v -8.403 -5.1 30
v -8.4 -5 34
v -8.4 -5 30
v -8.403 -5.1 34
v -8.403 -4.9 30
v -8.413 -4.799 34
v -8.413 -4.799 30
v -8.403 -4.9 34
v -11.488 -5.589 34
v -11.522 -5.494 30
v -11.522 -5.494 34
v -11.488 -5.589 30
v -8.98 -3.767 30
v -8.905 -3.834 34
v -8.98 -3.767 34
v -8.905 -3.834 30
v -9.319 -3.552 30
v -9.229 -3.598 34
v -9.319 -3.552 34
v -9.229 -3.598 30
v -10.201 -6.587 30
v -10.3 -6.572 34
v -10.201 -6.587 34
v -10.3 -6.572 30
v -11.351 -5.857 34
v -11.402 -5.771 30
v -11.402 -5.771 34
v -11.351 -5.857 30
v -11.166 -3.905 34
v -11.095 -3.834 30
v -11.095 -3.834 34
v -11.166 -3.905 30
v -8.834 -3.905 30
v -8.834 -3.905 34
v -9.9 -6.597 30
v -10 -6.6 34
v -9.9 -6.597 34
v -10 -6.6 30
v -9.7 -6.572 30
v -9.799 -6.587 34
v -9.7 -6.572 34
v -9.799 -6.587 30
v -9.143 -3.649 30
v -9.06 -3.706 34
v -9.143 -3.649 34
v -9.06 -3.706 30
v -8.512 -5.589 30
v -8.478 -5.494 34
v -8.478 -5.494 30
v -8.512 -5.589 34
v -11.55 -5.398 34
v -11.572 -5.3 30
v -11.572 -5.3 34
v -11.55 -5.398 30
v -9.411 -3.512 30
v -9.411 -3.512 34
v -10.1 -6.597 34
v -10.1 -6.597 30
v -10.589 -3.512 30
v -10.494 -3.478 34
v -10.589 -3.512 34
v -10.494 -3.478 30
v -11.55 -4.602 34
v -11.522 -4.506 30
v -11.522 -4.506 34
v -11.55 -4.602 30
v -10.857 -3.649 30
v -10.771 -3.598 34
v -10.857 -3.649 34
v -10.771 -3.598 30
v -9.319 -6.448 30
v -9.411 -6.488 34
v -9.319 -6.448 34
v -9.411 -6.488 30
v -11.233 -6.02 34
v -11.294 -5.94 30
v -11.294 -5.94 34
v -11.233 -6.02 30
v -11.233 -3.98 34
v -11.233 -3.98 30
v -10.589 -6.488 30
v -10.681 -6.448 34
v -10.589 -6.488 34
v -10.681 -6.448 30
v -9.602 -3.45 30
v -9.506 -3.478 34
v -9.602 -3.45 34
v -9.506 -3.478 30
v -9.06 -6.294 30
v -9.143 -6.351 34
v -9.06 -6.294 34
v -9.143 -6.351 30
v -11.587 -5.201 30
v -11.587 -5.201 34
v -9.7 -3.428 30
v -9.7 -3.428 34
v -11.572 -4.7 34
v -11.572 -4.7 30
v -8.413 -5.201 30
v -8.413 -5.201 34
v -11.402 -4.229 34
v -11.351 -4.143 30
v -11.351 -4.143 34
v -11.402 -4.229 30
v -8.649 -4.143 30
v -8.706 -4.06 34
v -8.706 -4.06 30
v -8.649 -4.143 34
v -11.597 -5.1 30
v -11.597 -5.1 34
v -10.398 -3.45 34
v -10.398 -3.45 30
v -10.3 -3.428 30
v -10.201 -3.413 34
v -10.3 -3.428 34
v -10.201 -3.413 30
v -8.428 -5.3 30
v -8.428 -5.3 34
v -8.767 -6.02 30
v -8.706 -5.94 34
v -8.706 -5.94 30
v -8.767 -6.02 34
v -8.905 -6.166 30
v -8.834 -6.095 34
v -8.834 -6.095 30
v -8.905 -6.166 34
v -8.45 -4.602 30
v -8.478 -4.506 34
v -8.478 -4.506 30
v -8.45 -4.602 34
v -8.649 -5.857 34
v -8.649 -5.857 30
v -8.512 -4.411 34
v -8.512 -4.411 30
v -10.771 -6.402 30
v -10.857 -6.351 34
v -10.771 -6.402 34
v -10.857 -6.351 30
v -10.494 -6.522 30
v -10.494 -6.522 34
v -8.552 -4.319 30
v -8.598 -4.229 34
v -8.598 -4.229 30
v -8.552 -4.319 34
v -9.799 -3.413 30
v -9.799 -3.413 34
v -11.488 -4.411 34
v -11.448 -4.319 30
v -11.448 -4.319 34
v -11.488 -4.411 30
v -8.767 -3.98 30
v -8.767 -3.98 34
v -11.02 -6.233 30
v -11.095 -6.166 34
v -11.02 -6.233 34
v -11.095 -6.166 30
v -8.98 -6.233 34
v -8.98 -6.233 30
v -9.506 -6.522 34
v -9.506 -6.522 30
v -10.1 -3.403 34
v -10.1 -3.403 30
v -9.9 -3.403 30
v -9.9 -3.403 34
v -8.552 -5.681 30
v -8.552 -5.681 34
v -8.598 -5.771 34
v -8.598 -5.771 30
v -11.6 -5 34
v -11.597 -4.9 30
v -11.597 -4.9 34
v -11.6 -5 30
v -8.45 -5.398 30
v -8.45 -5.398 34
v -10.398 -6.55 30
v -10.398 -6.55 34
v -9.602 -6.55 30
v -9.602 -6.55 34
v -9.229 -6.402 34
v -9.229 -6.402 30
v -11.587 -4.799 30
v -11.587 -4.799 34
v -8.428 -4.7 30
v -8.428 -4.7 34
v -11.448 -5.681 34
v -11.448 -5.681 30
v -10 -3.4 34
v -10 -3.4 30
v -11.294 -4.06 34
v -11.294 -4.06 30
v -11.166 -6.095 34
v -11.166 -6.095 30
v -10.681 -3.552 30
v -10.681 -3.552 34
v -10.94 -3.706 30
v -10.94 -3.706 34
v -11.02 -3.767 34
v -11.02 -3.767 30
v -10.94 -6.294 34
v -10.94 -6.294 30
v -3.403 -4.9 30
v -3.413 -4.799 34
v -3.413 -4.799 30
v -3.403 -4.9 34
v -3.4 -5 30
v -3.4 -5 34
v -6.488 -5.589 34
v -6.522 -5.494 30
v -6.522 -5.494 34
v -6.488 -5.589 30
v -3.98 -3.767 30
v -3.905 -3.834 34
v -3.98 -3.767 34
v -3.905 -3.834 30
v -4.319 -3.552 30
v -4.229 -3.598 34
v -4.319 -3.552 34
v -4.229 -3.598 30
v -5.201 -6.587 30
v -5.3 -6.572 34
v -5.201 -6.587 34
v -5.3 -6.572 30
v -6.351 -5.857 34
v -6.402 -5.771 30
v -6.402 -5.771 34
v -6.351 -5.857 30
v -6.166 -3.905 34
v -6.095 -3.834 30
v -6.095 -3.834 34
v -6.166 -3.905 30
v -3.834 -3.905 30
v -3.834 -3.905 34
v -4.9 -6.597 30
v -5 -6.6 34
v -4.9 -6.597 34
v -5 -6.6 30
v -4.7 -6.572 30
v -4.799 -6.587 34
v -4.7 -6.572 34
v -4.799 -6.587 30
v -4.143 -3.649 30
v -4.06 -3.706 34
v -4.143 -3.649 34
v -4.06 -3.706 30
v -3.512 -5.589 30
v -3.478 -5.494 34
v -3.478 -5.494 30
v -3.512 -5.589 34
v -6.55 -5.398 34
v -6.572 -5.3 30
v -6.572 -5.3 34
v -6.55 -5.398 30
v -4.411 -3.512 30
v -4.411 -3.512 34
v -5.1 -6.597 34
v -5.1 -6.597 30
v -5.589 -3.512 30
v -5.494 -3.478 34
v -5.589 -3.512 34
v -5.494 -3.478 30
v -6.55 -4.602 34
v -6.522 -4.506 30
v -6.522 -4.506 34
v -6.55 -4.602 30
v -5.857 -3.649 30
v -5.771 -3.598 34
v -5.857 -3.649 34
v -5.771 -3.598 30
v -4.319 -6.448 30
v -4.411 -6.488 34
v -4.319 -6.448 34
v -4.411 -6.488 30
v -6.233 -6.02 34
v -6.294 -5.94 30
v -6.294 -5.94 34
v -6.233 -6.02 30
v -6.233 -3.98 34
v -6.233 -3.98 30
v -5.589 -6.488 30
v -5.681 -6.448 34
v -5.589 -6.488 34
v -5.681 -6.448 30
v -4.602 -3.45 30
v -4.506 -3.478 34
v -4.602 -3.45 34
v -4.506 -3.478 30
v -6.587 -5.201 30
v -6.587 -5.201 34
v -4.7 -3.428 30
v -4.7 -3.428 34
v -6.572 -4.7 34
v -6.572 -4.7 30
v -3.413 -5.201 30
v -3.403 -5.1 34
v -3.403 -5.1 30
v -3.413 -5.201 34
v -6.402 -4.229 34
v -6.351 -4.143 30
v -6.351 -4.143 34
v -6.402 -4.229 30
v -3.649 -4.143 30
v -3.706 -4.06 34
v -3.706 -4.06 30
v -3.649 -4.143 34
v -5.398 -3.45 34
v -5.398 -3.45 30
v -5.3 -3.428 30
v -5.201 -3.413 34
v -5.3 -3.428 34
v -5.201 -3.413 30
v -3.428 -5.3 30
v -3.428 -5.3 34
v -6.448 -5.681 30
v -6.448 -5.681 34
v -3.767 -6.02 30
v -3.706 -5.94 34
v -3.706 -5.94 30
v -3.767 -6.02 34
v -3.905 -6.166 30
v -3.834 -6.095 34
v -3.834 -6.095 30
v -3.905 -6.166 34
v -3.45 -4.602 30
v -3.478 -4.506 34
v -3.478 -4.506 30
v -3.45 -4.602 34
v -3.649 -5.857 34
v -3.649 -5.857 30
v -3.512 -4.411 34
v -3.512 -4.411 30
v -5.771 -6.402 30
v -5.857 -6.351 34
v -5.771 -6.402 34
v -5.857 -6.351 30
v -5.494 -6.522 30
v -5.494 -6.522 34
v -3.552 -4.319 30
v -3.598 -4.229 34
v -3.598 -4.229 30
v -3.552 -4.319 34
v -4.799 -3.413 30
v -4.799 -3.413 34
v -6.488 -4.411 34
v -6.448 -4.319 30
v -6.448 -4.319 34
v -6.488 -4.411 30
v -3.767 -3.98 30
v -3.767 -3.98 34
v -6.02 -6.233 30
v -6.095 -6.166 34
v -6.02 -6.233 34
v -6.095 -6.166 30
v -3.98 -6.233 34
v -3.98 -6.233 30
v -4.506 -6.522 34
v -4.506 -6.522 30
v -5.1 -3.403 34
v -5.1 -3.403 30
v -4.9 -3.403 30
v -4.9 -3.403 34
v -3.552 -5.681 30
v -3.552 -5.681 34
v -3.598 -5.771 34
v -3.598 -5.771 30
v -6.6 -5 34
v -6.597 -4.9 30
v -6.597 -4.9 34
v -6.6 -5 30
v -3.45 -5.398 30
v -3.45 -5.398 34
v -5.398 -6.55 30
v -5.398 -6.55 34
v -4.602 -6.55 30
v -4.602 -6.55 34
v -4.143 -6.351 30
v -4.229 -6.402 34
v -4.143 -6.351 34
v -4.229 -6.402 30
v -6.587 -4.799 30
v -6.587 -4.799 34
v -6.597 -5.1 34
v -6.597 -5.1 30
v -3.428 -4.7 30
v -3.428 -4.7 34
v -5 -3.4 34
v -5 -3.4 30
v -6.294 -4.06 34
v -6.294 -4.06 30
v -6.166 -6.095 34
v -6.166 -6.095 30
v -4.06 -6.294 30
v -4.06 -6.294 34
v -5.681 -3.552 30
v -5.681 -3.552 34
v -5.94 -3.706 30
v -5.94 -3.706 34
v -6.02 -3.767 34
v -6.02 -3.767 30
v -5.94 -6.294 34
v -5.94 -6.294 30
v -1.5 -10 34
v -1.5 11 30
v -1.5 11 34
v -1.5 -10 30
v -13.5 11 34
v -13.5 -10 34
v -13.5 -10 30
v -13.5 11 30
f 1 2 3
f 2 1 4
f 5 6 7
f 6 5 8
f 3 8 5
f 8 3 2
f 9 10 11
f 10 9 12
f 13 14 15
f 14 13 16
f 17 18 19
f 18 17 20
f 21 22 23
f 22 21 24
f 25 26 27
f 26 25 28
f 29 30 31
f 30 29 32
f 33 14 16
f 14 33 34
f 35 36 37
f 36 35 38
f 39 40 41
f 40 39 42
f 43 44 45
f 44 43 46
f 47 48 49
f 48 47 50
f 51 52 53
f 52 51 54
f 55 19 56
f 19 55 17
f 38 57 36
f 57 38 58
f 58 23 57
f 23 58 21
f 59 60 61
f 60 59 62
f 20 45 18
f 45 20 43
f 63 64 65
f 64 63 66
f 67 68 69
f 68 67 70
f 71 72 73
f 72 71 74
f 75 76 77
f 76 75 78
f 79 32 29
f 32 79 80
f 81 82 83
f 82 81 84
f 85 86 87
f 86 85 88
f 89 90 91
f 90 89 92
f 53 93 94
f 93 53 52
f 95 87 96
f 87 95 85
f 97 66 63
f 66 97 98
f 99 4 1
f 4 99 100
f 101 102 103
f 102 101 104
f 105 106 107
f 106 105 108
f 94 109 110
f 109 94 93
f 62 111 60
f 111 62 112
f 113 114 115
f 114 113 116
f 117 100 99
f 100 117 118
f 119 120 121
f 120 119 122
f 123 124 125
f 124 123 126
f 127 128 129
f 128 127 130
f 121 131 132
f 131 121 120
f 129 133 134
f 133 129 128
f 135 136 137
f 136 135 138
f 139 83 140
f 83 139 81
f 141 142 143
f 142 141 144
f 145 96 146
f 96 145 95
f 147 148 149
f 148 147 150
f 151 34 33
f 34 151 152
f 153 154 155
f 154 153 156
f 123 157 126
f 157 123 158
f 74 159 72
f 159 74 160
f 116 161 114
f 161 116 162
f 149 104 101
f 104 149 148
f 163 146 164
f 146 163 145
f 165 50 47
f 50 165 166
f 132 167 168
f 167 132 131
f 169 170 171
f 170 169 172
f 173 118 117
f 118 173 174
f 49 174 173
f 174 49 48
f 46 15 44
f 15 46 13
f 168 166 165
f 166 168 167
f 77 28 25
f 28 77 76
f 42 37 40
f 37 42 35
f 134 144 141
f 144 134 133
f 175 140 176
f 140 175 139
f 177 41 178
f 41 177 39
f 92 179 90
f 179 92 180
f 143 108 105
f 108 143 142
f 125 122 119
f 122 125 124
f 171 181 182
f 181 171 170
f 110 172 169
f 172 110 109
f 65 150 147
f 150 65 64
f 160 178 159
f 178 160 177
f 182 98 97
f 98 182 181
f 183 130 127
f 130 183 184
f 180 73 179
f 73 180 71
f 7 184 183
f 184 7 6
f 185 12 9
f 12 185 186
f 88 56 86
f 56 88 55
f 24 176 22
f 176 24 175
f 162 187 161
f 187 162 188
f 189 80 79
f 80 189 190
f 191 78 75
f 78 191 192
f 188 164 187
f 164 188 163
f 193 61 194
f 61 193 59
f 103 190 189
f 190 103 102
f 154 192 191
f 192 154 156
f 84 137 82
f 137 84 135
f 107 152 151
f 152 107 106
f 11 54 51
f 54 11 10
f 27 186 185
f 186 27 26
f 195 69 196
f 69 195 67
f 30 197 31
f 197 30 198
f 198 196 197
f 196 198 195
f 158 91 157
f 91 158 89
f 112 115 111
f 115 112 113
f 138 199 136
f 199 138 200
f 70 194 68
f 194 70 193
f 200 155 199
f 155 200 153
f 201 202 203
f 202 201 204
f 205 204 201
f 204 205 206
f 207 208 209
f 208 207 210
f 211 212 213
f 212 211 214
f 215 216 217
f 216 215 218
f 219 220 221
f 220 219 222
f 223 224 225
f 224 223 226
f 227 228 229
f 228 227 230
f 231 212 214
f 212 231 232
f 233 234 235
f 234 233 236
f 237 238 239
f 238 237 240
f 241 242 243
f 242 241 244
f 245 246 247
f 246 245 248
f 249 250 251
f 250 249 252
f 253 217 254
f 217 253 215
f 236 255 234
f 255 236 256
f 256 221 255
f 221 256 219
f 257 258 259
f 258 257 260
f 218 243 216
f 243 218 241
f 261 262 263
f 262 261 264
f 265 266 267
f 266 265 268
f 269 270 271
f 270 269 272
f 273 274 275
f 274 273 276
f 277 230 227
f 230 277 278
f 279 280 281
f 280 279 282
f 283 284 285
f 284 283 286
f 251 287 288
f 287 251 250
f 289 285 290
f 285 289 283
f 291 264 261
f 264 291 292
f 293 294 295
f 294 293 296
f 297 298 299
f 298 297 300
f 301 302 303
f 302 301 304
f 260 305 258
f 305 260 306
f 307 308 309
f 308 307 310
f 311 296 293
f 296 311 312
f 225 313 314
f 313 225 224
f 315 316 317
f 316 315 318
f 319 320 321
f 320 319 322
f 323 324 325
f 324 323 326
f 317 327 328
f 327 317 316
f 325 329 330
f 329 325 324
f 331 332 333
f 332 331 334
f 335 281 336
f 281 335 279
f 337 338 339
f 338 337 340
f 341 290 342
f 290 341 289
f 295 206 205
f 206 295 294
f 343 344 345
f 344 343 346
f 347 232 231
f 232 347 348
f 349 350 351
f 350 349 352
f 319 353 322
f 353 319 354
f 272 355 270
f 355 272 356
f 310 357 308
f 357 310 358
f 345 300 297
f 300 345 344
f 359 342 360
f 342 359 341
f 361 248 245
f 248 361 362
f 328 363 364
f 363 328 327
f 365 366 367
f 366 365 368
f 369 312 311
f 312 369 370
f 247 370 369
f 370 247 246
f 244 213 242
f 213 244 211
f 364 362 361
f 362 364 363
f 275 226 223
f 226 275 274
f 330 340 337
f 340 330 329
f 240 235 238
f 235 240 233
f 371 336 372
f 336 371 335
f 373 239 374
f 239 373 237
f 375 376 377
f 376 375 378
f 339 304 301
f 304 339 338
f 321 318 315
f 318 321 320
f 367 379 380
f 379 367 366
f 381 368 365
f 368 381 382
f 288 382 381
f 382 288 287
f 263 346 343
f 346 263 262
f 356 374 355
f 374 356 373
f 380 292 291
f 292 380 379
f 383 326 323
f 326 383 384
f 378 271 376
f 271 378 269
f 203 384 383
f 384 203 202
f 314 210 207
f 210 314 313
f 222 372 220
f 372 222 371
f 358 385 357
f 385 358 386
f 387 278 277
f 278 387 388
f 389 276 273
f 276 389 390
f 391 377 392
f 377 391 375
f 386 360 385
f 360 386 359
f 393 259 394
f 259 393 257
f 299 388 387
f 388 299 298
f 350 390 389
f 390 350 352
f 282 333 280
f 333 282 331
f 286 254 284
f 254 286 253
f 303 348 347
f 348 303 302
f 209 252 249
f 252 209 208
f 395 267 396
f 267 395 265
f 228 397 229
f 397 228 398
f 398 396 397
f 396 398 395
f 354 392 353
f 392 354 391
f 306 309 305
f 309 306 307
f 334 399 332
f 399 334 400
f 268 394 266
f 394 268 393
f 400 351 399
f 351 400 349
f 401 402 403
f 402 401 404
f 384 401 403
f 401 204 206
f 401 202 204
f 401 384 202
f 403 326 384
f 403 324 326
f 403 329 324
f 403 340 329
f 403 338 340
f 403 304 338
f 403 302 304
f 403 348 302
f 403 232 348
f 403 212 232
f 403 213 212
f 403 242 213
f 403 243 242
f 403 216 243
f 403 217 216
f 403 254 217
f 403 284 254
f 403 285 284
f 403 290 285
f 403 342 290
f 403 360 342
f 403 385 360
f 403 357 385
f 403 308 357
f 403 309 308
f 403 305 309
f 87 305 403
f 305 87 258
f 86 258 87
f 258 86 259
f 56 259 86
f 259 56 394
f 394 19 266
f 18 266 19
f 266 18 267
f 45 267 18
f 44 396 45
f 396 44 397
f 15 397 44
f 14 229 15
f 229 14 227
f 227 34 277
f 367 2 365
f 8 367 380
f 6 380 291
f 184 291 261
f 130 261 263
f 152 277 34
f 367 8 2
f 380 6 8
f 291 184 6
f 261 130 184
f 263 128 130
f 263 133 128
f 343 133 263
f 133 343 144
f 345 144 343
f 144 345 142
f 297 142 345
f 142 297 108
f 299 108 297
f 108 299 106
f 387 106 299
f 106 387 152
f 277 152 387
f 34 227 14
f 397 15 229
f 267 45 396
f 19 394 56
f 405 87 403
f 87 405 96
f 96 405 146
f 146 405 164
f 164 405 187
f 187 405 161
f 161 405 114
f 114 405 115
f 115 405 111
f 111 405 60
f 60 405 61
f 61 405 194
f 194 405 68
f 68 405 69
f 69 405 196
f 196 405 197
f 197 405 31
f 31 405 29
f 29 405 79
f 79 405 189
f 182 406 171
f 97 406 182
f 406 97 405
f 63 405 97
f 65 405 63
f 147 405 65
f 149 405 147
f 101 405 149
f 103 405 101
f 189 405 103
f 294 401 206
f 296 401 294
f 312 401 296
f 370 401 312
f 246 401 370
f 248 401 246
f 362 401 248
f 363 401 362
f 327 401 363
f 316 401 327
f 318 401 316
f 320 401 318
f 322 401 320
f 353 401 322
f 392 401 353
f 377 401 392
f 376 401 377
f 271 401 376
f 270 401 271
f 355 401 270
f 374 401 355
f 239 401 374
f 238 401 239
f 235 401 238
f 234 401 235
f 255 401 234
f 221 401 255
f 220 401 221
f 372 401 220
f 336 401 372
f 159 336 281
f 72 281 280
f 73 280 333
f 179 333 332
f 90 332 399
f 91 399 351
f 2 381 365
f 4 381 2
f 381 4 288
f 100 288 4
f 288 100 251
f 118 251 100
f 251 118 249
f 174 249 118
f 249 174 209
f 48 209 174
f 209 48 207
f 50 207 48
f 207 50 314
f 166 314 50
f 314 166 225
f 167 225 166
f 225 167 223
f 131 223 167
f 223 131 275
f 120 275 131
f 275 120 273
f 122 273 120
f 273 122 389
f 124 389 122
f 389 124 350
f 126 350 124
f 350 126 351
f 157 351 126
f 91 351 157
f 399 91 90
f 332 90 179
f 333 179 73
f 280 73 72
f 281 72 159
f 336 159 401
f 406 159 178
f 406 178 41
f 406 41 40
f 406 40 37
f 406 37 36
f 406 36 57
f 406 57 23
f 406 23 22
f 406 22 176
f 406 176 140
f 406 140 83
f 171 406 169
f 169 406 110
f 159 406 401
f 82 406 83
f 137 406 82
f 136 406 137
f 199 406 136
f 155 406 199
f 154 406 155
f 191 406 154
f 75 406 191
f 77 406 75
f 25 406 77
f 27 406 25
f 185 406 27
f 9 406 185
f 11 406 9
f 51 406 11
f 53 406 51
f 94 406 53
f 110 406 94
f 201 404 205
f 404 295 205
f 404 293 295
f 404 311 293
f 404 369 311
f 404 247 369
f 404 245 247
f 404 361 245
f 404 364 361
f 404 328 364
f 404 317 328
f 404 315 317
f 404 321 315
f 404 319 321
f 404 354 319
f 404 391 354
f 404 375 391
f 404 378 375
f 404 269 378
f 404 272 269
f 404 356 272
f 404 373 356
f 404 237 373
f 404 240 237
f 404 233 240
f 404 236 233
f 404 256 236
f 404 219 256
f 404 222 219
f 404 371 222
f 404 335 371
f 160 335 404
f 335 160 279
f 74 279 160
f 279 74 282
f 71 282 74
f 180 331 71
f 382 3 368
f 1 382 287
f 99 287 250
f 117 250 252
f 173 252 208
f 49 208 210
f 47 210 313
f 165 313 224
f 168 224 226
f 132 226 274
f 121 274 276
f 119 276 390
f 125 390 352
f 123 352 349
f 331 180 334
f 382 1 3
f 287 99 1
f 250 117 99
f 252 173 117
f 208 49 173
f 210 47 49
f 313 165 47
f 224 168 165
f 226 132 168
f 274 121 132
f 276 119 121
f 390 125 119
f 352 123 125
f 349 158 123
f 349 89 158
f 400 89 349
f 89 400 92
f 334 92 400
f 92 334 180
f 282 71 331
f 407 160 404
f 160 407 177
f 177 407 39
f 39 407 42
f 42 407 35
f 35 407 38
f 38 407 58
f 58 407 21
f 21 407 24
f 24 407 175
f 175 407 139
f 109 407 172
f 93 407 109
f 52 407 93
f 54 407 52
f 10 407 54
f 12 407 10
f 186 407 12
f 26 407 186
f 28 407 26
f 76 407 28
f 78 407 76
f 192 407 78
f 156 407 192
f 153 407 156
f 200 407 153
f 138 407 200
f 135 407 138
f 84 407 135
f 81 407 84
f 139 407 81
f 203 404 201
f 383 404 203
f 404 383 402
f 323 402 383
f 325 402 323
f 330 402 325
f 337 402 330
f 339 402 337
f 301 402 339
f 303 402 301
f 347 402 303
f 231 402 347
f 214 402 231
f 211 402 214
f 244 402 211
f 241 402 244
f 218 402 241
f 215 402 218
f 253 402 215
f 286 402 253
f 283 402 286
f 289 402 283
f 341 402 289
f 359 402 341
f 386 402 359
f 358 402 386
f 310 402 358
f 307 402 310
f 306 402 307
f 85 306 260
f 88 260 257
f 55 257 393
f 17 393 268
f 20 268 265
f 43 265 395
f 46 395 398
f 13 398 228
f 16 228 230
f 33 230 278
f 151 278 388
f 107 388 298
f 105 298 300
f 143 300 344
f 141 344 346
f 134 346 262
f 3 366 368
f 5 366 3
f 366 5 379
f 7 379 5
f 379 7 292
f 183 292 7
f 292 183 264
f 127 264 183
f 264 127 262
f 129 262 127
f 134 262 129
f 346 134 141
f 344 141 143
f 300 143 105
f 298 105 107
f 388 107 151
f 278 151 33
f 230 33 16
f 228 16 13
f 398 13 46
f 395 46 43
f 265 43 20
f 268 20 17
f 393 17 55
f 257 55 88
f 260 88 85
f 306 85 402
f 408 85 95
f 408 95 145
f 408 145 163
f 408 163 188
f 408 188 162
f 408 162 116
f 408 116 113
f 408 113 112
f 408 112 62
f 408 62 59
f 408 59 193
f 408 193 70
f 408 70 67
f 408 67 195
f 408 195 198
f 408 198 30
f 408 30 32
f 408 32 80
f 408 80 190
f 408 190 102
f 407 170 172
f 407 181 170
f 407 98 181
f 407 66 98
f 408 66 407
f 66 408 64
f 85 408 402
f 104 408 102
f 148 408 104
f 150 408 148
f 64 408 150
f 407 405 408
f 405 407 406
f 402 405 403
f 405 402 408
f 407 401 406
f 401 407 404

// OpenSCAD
difference(){
	union(){
        
        translate([-13.5,-10,30]){
            cube([
            12,
            21,
            ,4], center=false);
        }       

        

	}
	union() {
        // schroefgaten voor ashouder1
        translate([-10,-5,0]){
                cylinder(h=100, r=1.6, $fn=100, center=false);
        }  
        translate([-5,-5,0]){
                cylinder(h=100, r=1.6, $fn=100, center=false);
        }  
	}
}
